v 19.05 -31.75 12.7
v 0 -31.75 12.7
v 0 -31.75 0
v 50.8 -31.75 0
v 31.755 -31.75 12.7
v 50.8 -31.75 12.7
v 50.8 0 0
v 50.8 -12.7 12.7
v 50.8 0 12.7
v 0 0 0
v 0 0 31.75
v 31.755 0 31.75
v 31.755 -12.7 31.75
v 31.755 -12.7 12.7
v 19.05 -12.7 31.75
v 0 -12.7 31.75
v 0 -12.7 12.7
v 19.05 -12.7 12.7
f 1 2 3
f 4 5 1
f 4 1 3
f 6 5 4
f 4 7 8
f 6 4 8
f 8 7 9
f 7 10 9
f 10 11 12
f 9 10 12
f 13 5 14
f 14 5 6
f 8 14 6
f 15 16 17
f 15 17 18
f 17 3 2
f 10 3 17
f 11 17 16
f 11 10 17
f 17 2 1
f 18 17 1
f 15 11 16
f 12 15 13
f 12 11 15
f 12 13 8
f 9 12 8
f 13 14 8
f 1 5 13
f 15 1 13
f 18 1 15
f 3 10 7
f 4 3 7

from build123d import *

# Parameters (mm, degrees)
F0_W      = 50.8
F0_H      = 31.75
F1_DEPTH  = 31.75
F3_W      = 19.05
F3_H      = 19.05
F4_DEPTH  = 19.05
F5_W      = 19.0453663528
F5_H      = 19.05
F6_DEPTH  = 19.05
F8_DEPTH  = 25.4
F10_DEPTH = 25.4


with BuildPart() as f1:
    # F0 (on Front) → F1 (new body)
    with BuildSketch(Plane.XZ):
        with Locations((25.4, 15.875)):
            Rectangle(F0_W, F0_H)
    extrude(amount=F1_DEPTH)

    # F3 (on face) → F4 (cut)
    with BuildSketch(Plane.XZ.offset(31.75)):
        with Locations((9.525, 22.225)):
            Rectangle(F3_W, F3_H)
    extrude(amount=-F4_DEPTH, mode=Mode.SUBTRACT)

    # F5 (on face) → F6 (cut)
    with BuildSketch(Plane.XZ.offset(31.75)):
        with Locations((41.2773168236, 22.225)):
            Rectangle(F5_W, F5_H)
    extrude(amount=-F6_DEPTH, mode=Mode.SUBTRACT)

    # F7 (on face) → F8 (cut)
    with BuildSketch(Plane.YZ.offset(31.7546336472)):
        Polygon((-31.75, 31.75), (-31.75, 12.7), (-12.7, 31.75), align=None)
    extrude(amount=-F8_DEPTH, mode=Mode.SUBTRACT)

    # F9 (on face) → F10 (cut)
    with BuildSketch(Plane.XZ.offset(12.7)):
        Polygon((50.8, 31.75), (31.7546336472, 31.75), (50.8, 12.7), align=None)
    extrude(amount=-F10_DEPTH, mode=Mode.SUBTRACT)


solid = f1.part
